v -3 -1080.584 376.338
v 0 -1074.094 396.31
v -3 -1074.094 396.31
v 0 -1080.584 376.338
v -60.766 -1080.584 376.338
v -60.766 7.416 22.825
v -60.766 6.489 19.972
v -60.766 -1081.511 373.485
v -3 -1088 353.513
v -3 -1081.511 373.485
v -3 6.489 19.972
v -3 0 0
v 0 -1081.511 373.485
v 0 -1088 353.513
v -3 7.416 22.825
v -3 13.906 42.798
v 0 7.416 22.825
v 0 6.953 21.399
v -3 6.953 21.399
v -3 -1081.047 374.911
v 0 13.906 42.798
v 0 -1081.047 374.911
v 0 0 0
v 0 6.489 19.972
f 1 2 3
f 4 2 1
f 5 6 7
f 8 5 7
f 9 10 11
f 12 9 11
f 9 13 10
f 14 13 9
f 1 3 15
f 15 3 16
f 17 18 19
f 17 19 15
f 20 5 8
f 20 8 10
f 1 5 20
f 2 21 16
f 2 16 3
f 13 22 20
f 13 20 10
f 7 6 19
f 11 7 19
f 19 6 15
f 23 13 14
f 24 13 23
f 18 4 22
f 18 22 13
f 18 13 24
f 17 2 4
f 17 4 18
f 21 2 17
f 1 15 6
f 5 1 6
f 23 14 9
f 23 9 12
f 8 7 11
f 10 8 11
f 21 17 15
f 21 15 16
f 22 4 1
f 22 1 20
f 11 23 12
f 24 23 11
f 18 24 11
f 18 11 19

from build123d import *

# Parameters (mm, degrees)
F1_DEPTH = 3
F3_DEPTH = 1143.9908999712


# Not quite as in the source:
# - ends of sketch curves that miss each other by under 0.0002 mm in the source are joined
# - a feature names something its author has since deleted; it is built from what else it names


with BuildPart() as f1:
    # F0 (on Right) → F1 (new body)
    with BuildSketch(Plane.YZ):
        Polygon((-1080.583592135, 376.3379858925), (7.416407865, 22.8253563911), (13.9057647469, 42.7975432333), (-1074.0942352531, 396.3101727347), align=None)
        Polygon((-1088, 353.5126295014), (0, 0), (6.4893568819, 19.9721868422), (-1081.5106431181, 373.4848163436), align=None)
        Polygon((-1081.5106431181, 373.4848163436), (6.4893568819, 19.9721868422), (6.9528823734, 21.3987716166), (-1081.0471176266, 374.911401118), align=None)
        Polygon((-1081.0471176266, 374.911401118), (6.9528823734, 21.3987716166), (7.416407865, 22.8253563911), (-1080.583592135, 376.3379858925), align=None)
    extrude(amount=-F1_DEPTH)

    # F2 (on face) → F3 (join, through all)
    with BuildSketch(Plane(origin=(0, -1088, 353.5126295014), x_dir=(1, 0, 0), z_dir=(0, -0.9510565163, 0.3090169944))):
        Polygon((-60.7660203681, 22.5), (-57.3180156743, 22.5), (-3, 22.5), (-3, 24), (-60.7660203681, 24), align=None)
        Polygon((-3, 21), (-3, 22.5), (-3.1967548982, 21), align=None)
        Polygon((-3.1967548982, 21), (-3, 22.5), (-6.2963244545, 21), align=None)
        Polygon((-3, 22.5), (-57.3180188703, 22.5), (-57.5147689745, 21), (-6.2963244545, 21), align=None)
        Polygon((-57.5147689745, 21), (-57.3180140763, 22.5), (-60.7660203681, 22.5), (-60.7660203681, 21), align=None)
    extrude(amount=-F3_DEPTH)


solid = f1.part
